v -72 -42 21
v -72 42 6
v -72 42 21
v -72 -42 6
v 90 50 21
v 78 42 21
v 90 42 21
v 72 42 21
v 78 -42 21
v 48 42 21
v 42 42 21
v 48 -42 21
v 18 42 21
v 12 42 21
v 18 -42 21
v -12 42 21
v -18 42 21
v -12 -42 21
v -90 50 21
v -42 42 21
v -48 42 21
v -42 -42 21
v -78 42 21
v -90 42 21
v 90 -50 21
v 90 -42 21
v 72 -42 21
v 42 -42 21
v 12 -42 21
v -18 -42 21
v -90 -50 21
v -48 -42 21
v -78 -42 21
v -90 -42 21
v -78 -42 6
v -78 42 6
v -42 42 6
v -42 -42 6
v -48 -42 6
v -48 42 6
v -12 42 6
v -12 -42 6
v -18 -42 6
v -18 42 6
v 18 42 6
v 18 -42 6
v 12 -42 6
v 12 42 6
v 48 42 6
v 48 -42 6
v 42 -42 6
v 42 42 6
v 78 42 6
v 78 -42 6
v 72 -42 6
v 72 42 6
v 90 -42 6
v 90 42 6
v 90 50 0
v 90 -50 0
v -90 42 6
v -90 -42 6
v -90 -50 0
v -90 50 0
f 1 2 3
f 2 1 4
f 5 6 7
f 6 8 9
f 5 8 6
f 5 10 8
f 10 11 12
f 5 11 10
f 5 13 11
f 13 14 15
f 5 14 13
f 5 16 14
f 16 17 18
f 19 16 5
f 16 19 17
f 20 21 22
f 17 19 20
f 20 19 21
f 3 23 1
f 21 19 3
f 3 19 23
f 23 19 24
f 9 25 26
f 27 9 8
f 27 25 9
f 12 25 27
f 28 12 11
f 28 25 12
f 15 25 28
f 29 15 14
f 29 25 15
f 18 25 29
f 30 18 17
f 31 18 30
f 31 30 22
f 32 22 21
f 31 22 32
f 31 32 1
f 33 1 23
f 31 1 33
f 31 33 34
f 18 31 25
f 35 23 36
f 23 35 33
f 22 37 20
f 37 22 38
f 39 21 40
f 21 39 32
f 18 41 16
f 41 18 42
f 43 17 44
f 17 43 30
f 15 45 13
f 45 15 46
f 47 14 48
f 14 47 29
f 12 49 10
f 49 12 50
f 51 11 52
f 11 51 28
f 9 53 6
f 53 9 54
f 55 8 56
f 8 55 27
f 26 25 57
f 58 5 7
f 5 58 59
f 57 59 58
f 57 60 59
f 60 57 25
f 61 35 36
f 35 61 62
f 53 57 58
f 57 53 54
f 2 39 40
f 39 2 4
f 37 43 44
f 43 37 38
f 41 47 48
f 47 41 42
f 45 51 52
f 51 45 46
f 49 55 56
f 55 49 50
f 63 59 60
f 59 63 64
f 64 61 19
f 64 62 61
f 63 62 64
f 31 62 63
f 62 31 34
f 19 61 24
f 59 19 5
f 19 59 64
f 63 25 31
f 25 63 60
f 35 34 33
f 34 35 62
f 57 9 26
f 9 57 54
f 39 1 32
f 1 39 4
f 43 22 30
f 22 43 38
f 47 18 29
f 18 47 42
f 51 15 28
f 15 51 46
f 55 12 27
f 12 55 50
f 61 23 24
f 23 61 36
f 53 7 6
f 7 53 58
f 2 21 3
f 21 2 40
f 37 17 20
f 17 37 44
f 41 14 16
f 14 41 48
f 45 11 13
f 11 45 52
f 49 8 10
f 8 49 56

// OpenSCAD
$fn = 32;

// ----------------------------------------------------------------------
// Rib frame 180 x 100 x 21
// 6 ribs at 30 mm pitch
// ----------------------------------------------------------------------

// --- parameters (mm) ---
frame = [180, 100, 6];  // base plate size (x, y, z)
rail_w = 8;             // side rail width
ribs = 6;               // number of ribs
rib_t = 6;              // rib thickness
rib_h = 15;             // rib height above the base plate
pitch = 30;             // pitch between rib centres

// --- derived feature positions (mm) ---
span = (ribs - 1) * pitch;          // = 150   distance between the outer ribs
origin_x = -span / 2;               // = -75   X of the first rib
rib_len = frame[1] - 2 * rail_w + 2;  // = 86   rib length, 1 mm into each rail
feature_centers = [
  [origin_x + 0 * pitch, 0],
  [origin_x + 1 * pitch, 0],
  [origin_x + 2 * pitch, 0],
  [origin_x + 3 * pitch, 0],
  [origin_x + 4 * pitch, 0],
  [origin_x + 5 * pitch, 0]
];   // rib centre line, drives the rib loop

// base plate, two side rails, then the ribs read straight off feature_centers
union() {
  translate([-frame[0] / 2, -frame[1] / 2, 0]) cube(frame);
  translate([-frame[0] / 2, -frame[1] / 2, 0]) cube([frame[0], rail_w, frame[2] + rib_h]);
  translate([-frame[0] / 2, frame[1] / 2 - rail_w, 0]) cube([frame[0], rail_w, frame[2] + rib_h]);
  for (centre = feature_centers)
    translate([centre[0] - rib_t / 2, centre[1] - rib_len / 2, frame[2] - 1])
      cube([rib_t, rib_len, rib_h + 1]);
}
